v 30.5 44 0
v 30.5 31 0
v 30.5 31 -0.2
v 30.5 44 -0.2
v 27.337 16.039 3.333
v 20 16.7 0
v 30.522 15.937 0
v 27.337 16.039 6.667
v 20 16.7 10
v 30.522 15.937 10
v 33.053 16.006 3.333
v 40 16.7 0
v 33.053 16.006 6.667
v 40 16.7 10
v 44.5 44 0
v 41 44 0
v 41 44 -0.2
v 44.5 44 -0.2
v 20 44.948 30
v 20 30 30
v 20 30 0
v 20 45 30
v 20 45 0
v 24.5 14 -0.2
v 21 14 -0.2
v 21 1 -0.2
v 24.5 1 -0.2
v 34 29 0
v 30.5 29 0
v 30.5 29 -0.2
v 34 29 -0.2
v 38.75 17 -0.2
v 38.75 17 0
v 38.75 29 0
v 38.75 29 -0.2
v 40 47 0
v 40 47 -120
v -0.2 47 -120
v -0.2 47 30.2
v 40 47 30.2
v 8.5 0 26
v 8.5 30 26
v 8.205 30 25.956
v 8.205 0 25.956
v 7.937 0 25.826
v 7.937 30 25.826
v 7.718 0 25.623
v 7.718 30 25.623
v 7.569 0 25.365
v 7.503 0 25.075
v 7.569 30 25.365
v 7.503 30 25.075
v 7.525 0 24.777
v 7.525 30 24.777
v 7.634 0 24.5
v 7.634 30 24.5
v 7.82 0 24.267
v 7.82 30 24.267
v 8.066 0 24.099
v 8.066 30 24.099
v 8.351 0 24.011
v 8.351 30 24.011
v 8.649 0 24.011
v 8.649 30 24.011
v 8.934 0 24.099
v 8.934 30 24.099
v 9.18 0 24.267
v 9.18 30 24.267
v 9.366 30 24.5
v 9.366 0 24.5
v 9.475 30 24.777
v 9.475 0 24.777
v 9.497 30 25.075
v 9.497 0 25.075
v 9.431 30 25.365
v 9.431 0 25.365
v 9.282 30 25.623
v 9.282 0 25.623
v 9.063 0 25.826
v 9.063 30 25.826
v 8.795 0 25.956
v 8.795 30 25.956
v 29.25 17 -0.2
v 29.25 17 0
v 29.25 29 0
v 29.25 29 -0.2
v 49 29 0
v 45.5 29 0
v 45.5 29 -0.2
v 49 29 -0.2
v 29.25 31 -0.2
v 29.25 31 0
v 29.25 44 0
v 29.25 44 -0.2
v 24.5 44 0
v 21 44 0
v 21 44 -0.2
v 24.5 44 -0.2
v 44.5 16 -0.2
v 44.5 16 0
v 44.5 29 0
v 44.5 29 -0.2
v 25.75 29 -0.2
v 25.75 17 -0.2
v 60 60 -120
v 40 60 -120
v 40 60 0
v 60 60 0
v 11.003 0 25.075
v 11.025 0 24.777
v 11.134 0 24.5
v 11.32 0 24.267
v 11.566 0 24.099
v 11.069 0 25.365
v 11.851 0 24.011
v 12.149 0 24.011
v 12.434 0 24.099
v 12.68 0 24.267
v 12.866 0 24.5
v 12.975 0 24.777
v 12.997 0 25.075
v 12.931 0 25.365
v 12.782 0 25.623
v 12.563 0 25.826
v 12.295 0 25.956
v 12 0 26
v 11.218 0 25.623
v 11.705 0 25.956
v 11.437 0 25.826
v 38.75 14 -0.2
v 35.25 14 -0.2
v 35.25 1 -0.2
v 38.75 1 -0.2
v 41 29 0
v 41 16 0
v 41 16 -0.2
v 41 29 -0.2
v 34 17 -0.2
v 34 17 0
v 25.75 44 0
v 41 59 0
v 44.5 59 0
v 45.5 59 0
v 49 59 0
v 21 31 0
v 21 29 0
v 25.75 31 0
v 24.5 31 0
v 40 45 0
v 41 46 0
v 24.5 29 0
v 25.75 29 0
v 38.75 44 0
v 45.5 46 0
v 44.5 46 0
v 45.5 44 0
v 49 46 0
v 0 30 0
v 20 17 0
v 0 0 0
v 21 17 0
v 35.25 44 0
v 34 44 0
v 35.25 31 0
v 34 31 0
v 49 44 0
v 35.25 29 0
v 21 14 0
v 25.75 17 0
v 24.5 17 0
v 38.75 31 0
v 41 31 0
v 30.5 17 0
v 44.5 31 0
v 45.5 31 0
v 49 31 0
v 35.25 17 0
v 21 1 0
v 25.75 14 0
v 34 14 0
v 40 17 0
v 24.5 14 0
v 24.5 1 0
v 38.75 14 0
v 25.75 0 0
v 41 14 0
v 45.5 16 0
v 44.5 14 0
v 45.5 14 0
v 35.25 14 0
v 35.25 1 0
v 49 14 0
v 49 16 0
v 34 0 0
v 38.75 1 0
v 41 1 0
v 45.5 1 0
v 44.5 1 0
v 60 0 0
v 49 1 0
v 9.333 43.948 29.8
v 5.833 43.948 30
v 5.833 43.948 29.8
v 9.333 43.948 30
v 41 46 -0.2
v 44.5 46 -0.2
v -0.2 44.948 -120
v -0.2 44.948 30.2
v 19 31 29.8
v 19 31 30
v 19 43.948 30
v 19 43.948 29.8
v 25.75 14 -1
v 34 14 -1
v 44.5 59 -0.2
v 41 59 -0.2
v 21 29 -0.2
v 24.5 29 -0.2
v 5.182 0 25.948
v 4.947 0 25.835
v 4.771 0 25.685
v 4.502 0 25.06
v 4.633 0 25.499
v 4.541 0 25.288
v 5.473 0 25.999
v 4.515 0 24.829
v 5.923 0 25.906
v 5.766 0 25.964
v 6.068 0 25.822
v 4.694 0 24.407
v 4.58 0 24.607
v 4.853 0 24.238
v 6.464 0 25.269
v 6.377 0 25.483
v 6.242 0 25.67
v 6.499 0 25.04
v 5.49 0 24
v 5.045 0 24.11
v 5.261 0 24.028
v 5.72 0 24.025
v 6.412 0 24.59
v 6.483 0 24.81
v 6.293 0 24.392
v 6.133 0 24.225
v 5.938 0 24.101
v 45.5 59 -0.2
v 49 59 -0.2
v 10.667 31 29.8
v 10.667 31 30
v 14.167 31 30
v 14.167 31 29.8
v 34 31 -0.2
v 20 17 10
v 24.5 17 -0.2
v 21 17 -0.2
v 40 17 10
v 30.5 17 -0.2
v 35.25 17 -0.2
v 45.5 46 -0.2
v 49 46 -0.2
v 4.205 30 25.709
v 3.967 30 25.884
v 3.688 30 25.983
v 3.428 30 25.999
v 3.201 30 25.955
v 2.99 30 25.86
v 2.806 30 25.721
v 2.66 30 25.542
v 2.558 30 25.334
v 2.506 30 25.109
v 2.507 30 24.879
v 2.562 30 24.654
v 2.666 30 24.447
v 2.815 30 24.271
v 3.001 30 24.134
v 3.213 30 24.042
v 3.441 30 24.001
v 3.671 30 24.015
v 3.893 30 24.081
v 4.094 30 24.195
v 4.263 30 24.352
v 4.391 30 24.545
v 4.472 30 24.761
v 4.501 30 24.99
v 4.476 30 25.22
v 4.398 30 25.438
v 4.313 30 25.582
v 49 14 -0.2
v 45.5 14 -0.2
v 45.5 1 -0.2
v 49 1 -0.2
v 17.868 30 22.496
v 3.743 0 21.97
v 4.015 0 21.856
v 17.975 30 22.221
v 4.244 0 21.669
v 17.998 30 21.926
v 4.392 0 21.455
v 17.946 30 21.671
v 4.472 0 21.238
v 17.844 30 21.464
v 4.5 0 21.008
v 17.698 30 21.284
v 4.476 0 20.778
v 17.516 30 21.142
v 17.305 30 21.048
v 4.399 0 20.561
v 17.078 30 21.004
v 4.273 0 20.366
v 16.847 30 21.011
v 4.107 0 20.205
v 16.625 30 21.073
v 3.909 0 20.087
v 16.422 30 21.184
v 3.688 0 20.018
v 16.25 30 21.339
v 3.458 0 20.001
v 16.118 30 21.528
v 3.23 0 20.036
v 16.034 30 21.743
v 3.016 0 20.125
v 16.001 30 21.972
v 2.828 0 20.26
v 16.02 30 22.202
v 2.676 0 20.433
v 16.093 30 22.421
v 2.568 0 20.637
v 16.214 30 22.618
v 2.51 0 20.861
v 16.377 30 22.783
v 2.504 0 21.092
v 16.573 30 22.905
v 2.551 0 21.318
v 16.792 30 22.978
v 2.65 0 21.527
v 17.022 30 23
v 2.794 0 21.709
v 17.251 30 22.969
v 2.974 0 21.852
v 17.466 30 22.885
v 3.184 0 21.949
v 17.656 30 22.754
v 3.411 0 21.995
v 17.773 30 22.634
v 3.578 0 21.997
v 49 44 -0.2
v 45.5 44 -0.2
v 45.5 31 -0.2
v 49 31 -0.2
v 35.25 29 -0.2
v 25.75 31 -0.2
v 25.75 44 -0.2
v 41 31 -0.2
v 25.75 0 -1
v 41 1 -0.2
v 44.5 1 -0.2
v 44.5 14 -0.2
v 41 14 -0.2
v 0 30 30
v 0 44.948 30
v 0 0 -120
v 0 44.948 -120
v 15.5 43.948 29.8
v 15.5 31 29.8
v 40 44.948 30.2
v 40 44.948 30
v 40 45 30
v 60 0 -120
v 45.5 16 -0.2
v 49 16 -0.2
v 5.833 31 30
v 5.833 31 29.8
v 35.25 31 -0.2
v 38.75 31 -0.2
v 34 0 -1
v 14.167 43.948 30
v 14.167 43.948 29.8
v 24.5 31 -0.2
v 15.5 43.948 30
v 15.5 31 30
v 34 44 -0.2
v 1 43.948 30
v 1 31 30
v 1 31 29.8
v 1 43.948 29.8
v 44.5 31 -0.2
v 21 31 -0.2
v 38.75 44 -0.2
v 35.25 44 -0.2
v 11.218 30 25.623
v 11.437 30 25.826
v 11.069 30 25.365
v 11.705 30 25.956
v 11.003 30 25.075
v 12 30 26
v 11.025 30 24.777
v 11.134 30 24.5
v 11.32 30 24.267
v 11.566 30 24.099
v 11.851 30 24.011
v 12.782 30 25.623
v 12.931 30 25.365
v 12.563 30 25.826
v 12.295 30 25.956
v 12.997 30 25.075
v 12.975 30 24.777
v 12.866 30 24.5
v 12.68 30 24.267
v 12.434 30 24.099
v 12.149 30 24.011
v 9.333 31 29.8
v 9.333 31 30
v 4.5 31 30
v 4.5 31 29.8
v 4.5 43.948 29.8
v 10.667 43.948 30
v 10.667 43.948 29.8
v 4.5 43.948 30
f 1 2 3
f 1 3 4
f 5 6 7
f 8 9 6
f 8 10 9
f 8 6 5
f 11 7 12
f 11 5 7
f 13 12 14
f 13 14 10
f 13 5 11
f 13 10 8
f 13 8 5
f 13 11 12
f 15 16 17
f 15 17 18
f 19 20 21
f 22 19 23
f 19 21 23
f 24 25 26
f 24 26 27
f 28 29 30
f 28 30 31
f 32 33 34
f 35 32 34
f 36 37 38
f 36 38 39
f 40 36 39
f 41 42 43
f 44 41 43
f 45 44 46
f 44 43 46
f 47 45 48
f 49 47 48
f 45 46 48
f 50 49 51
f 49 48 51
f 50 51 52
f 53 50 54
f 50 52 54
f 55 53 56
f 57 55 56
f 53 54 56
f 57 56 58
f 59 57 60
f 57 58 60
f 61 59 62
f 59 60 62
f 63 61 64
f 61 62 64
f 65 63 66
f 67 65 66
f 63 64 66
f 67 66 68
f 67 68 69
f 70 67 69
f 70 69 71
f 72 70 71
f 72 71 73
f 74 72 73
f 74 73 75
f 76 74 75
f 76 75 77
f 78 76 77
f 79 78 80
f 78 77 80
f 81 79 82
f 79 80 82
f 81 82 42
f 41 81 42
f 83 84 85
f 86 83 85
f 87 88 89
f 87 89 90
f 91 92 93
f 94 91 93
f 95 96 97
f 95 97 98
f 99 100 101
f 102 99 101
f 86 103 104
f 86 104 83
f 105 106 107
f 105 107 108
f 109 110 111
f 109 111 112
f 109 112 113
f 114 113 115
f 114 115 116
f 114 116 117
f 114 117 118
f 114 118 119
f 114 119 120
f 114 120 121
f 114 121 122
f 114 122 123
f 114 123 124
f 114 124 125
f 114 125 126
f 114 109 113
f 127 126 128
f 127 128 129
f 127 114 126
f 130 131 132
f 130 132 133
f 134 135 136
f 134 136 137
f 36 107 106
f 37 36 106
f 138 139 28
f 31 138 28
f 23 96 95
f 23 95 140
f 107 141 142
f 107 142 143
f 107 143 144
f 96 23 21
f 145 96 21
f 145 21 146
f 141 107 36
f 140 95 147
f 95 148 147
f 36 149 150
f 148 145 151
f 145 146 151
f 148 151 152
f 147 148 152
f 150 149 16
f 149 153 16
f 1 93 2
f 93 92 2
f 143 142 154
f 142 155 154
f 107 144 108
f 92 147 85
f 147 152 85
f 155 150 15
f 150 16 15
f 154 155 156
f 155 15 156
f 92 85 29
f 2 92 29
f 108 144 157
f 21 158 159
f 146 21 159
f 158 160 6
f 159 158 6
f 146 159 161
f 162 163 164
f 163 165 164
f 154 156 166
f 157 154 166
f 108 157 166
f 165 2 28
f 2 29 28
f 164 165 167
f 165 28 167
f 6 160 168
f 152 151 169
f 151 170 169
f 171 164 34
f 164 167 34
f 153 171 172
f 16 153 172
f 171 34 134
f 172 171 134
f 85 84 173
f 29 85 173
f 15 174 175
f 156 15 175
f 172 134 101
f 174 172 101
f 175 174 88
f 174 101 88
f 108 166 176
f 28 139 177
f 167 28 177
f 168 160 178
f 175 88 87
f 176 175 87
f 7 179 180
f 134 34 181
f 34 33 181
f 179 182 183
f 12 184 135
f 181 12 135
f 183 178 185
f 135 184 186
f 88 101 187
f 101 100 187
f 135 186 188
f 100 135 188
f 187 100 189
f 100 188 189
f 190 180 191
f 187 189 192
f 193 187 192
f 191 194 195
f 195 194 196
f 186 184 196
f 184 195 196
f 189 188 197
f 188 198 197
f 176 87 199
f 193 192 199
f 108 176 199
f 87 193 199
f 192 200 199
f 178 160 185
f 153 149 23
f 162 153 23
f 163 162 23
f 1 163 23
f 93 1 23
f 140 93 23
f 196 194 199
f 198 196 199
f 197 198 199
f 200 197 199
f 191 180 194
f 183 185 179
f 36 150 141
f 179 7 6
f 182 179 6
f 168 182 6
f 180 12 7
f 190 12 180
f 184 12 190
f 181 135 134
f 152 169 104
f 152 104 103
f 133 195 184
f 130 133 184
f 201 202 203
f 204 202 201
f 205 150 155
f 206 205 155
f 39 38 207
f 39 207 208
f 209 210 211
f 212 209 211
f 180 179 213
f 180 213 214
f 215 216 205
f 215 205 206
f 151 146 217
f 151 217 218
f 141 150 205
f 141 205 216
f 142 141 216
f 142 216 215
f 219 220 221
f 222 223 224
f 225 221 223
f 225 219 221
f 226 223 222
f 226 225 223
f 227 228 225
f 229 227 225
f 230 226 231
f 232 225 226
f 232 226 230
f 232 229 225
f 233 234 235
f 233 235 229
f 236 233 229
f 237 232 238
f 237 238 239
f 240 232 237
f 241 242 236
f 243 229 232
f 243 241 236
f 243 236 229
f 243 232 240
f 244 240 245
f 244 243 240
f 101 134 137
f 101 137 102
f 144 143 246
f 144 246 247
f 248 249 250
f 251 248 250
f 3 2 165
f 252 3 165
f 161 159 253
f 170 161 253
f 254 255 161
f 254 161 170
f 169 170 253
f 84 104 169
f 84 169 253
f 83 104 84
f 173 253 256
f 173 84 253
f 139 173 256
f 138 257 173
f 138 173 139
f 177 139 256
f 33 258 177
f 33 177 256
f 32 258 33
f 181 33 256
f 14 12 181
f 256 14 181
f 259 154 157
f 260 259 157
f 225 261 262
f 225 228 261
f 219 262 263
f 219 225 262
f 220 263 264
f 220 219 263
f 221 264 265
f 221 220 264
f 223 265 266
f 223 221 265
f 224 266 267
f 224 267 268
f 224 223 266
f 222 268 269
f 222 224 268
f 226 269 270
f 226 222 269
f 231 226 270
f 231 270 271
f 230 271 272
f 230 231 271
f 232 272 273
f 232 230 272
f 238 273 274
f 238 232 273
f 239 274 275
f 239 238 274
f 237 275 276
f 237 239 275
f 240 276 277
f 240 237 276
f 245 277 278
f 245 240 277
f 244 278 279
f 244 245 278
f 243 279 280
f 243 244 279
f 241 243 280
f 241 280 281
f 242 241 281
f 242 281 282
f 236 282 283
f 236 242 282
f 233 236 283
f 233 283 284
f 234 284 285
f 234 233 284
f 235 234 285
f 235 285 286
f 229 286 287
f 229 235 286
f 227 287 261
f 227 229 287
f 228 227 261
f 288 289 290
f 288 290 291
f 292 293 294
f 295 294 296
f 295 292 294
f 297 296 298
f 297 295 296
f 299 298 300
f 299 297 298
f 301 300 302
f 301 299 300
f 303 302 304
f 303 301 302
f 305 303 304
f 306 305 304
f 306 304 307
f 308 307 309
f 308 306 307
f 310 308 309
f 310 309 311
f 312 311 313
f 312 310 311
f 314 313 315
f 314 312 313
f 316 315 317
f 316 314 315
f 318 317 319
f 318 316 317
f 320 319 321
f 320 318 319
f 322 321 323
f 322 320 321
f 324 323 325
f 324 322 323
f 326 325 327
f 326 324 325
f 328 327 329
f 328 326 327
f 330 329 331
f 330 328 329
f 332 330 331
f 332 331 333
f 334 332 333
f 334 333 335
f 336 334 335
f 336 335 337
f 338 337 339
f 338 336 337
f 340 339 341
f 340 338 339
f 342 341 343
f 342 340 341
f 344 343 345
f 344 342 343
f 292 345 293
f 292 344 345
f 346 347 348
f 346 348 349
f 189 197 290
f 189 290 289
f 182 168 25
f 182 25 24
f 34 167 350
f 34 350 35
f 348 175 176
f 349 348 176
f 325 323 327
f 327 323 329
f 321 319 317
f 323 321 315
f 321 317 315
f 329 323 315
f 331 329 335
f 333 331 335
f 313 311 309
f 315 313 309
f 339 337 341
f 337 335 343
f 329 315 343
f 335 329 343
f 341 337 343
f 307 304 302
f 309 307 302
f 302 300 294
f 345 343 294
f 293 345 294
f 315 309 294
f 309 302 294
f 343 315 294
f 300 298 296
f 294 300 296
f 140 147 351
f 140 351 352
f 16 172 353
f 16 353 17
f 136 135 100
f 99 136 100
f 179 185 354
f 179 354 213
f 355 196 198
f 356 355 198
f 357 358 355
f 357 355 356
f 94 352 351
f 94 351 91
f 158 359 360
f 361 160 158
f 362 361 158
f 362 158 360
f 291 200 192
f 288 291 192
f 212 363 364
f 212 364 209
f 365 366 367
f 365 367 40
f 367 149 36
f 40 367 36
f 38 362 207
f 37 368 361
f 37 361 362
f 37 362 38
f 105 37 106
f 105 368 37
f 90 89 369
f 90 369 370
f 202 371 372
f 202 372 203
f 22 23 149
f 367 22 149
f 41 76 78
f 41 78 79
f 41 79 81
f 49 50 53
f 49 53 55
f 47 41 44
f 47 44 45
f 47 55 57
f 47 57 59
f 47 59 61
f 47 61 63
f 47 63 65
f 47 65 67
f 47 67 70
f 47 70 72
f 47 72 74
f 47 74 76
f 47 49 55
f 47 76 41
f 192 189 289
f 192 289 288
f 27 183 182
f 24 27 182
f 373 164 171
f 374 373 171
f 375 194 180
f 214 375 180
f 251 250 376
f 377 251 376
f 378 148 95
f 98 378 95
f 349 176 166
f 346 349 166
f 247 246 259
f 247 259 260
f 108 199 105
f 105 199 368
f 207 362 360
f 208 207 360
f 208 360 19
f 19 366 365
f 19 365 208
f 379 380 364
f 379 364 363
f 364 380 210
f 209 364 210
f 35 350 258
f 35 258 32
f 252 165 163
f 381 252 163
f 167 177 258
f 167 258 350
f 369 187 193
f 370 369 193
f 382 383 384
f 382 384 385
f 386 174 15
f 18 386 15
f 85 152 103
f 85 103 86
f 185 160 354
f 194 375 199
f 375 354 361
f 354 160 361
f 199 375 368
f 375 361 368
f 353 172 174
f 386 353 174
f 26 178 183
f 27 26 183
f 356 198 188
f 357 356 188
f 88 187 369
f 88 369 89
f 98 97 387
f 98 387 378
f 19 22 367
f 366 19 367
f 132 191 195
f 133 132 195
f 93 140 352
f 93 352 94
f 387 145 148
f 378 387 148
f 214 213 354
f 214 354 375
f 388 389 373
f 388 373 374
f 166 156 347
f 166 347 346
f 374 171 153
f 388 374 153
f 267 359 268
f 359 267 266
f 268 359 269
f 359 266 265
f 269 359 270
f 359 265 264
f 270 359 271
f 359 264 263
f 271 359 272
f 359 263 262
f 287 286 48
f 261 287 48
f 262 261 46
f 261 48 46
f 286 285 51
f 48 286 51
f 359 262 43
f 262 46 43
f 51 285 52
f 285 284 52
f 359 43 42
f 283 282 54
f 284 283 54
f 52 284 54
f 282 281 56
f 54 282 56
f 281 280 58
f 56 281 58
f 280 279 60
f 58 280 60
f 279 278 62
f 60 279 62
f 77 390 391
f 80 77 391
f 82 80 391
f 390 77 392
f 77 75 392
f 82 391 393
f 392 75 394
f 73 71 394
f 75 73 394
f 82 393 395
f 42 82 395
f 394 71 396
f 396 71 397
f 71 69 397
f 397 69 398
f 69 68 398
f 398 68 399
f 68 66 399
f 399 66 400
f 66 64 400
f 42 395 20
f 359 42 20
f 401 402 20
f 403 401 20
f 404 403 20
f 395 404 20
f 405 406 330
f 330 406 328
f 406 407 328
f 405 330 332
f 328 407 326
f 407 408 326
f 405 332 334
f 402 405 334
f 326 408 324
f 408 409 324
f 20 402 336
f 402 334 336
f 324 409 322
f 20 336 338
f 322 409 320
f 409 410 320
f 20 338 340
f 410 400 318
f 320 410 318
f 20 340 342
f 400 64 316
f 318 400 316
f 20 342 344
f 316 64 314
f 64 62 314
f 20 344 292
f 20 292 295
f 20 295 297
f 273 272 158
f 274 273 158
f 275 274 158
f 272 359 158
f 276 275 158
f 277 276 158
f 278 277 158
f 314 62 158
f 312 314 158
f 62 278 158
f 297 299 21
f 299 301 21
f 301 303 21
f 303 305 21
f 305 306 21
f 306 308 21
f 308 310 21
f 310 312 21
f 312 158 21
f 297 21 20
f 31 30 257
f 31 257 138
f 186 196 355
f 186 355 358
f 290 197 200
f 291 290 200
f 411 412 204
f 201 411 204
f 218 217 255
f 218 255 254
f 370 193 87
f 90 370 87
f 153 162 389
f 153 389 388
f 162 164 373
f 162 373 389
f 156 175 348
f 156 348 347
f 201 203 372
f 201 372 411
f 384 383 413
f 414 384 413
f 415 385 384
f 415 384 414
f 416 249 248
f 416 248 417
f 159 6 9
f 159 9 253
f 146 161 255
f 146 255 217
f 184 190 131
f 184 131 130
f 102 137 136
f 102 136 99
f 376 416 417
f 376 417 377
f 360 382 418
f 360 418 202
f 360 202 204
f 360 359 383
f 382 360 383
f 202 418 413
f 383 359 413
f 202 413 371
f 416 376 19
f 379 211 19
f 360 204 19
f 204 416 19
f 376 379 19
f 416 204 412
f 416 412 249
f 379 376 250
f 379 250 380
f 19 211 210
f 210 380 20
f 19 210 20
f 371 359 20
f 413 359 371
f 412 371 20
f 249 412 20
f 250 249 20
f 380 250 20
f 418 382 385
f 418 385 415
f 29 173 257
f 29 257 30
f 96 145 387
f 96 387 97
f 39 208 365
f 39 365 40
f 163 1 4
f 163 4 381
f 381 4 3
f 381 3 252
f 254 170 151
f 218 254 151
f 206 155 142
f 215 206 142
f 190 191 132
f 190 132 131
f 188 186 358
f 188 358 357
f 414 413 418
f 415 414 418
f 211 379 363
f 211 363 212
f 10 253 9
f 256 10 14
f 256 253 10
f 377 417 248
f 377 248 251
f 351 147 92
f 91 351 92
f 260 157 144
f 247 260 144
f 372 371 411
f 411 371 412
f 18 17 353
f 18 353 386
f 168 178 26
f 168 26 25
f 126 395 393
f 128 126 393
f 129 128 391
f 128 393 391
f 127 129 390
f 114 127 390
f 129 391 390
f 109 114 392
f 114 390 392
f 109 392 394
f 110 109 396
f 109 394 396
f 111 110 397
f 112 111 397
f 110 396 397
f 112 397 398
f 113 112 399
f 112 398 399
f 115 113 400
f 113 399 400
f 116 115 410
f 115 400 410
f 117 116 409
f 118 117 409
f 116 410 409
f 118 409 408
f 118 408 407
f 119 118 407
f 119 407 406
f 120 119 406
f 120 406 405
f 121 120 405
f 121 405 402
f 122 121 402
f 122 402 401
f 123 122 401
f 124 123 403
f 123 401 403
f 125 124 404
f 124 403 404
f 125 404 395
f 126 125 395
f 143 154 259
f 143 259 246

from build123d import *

# Parameters (mm, degrees)
SKETCH1_W                = 60
SKETCH1_H                = 120
BOSS_EXTRUDE1_DEPTH      = 60
SKETCH2_W                = 40
SKETCH2_H                = 120
CUT_EXTRUDE1_DEPTH       = 15
SKETCH3_W                = 20
SKETCH3_H                = 15
BOSS_EXTRUDE2_DEPTH      = 30
SKETCH4_W                = 40
SKETCH4_H                = 150
BOSS_EXTRUDE3_DEPTH      = 2
SKETCH6_W                = 3.5
SKETCH6_H                = 13
CUT_EXTRUDE2_DEPTH       = 0.2
SKETCH7_W                = 40
SKETCH7_H                = 2.051563456
BOSS_EXTRUDE5_DEPTH      = 0.2
SKETCH8_W                = 3.5
SKETCH8_H                = 12.948436544
CUT_EXTRUDE3_DEPTH       = 0.2
SKETCH9_W                = 3.5
SKETCH9_H                = 13
CUT_EXTRUDE4_DEPTH       = 0.2
BOSS_EXTRUDE6_DEPTH      = 10
BOSS_EXTRUDE6_DEPTH_BACK = 5
SKETCH5_W                = 20
SKETCH5_H                = 2
CUT_EXTRUDE6_DEPTH       = 10
SKETCH11_R               = 1
BOSS_EXTRUDE7_DEPTH      = 30
SKETCH16_W               = 8.25
SKETCH16_H               = 14
CUT_EXTRUDE10_DEPTH      = 1
SKETCH17_W               = 150.2
SKETCH17_H               = 2.051563456
BOSS_EXTRUDE8_DEPTH      = 0.2


with BuildPart() as part:
    # Sketch1 → Boss-Extrude1 (new body)
    with BuildSketch(Plane(origin=(0, 0, 0), x_dir=(1, 0, 0), z_dir=(0, 1, 0))):
        with Locations((30, 60)):
            Rectangle(SKETCH1_W, SKETCH1_H)
    extrude(amount=BOSS_EXTRUDE1_DEPTH)

    # Sketch2 → Cut-Extrude1 (cut)
    with BuildSketch(Plane(origin=(0, 60, 0), x_dir=(1, 0, 0), z_dir=(0, 1, 0))):
        with Locations((20, 60)):
            Rectangle(SKETCH2_W, SKETCH2_H)
    extrude(amount=-CUT_EXTRUDE1_DEPTH, mode=Mode.SUBTRACT)

    # Sketch3 → Boss-Extrude2 (add)
    with BuildSketch(Plane.XY):
        with Locations((10, 37.5)):
            Rectangle(SKETCH3_W, SKETCH3_H)
    extrude(amount=BOSS_EXTRUDE2_DEPTH)

    # Sketch4 → Boss-Extrude3 (add)
    with BuildSketch(Plane(origin=(0, 45, 0), x_dir=(1, 0, 0), z_dir=(0, 1, 0))):
        with Locations((20, 45)):
            Rectangle(SKETCH4_W, SKETCH4_H)
    extrude(amount=BOSS_EXTRUDE3_DEPTH)

    # Sketch6 → Cut-Extrude2 (cut)
    with BuildSketch(Plane.XY):
        with Locations((42.75, 52.5)):
            Rectangle(SKETCH6_W, SKETCH6_H)
        with Locations((47.25, 52.5)):
            Rectangle(SKETCH6_W, SKETCH6_H)
        with Locations((42.75, 37.5)):
            Rectangle(SKETCH6_W, SKETCH6_H)
        with Locations((47.25, 37.5)):
            Rectangle(SKETCH6_W, SKETCH6_H)
        with Locations((42.75, 22.5)):
            Rectangle(SKETCH6_W, SKETCH6_H)
        with Locations((47.25, 22.5)):
            Rectangle(SKETCH6_W, SKETCH6_H)
        with Locations((42.75, 7.5)):
            Rectangle(SKETCH6_W, SKETCH6_H)
        with Locations((47.25, 7.5)):
            Rectangle(SKETCH6_W, SKETCH6_H)
    extrude(amount=-CUT_EXTRUDE2_DEPTH, mode=Mode.SUBTRACT)

    # Sketch7 → Boss-Extrude5 (add)
    with BuildSketch(Plane.XY.offset(30)):
        with Locations((20, 45.974218272)):
            Rectangle(SKETCH7_W, SKETCH7_H)
    extrude(amount=BOSS_EXTRUDE5_DEPTH)

    # Sketch8 → Cut-Extrude3 (cut)
    with BuildSketch(Plane.XY.offset(30)):
        with Locations((2.75, 37.474218272)):
            Rectangle(SKETCH8_W, SKETCH8_H)
        with Locations((7.583333333, 37.474218272)):
            Rectangle(SKETCH8_W, SKETCH8_H)
        with Locations((12.416666667, 37.474218272)):
            Rectangle(SKETCH8_W, SKETCH8_H)
        with Locations((17.25, 37.474218272)):
            Rectangle(SKETCH8_W, SKETCH8_H)
    extrude(amount=-CUT_EXTRUDE3_DEPTH, mode=Mode.SUBTRACT)

    # Sketch9 → Cut-Extrude4 (cut)
    with BuildSketch(Plane.XY):
        with Locations((22.75, 37.5)):
            Rectangle(SKETCH9_W, SKETCH9_H)
        with Locations((27.5, 37.5)):
            Rectangle(SKETCH9_W, SKETCH9_H)
        with Locations((32.25, 37.5)):
            Rectangle(SKETCH9_W, SKETCH9_H)
        with Locations((37, 37.5)):
            Rectangle(SKETCH9_W, SKETCH9_H)
        with Locations((27.5, 22.5)):
            Rectangle(SKETCH9_W, SKETCH9_H)
        with Locations((32.25, 22.5)):
            Rectangle(SKETCH9_W, SKETCH9_H)
        with Locations((37, 22.5)):
            Rectangle(SKETCH9_W, SKETCH9_H)
        with Locations((27.5, 7.5)):
            Rectangle(SKETCH9_W, SKETCH9_H)
        with Locations((32.25, 7.5)):
            Rectangle(SKETCH9_W, SKETCH9_H)
        with Locations((37, 7.5)):
            Rectangle(SKETCH9_W, SKETCH9_H)
        with Locations((22.75, 22.5)):
            Rectangle(SKETCH9_W, SKETCH9_H)
        with Locations((22.75, 7.5)):
            Rectangle(SKETCH9_W, SKETCH9_H)
    extrude(amount=-CUT_EXTRUDE4_DEPTH, mode=Mode.SUBTRACT)

    # Sketch5 → Boss-Extrude6 (add, two sides: drawn at the far end of the back side and taken through both)
    with BuildSketch(Plane.XY.offset(-BOSS_EXTRUDE6_DEPTH_BACK)):
        with Locations((30, 16)):
            Rectangle(SKETCH5_W, SKETCH5_H)
    extrude(amount=BOSS_EXTRUDE6_DEPTH + BOSS_EXTRUDE6_DEPTH_BACK)

    # Sketch10 → Cut-Extrude6 (cut)
    with BuildSketch(Plane.XY.offset(10)):
        with BuildLine():
            Line((20, 16.7), (20, 14.90002652))
            Line((20, 14.90002652), (40, 15))
            Line((40, 15), (40, 16.7))
            add(Edge.make_bspline(
                [(20, 16.7), (29.09733539, 15.758398235), (31.486505864, 15.609879035), (40, 16.7)],
                knots=[0, 0, 0, 0, 1, 1, 1, 1], degree=3))
        make_face()
    extrude(amount=-CUT_EXTRUDE6_DEPTH, mode=Mode.SUBTRACT)

    # Sketch11 → Boss-Extrude7 (add)
    with BuildSketch(Plane(origin=(0, 30, 0), x_dir=(-1, 0, 0), z_dir=(0, -1, 0))):
        with Locations(Location((-8.5, -25, 0), (0, 0, 270))):
            Circle(SKETCH11_R)
        with Locations(Location((-12, -25, 0), (0, 0, 270))):
            Circle(SKETCH11_R)
    extrude(amount=BOSS_EXTRUDE7_DEPTH)

    # Boundary2: read off the stored shape, not the designer's step
    # Boundary2: loft between two sections, ruled curve by curve
    boundary2_from = [
        Edge.make_bspline([(4.204798324, 30, 25.709407727), (4.019075815, 30, 25.893923496), (3.495882591, 30, 26.110214391), (2.712993599, 30, 25.781419672), (2.391347556, 30, 24.99649345), (2.718236803, 30, 24.213124048), (3.503720437, 30, 23.891348254), (4.286533285, 30, 24.218104118), (4.610217643, 30, 25.003119773), (4.390520832, 30, 25.524891957), (4.204798324, 30, 25.709407727)], [0, 0, 0, 0, 0.125, 0.25, 0.375, 0.5, 0.625, 0.75, 0.875, 1, 1, 1, 1], 3),
    ]
    boundary2_to = [
        Edge.make_bspline([(5.766012578, 0, 25.963969558), (5.513645938, 0, 26.033611488), (4.951638215, 0, 25.965345689), (4.430818642, 0, 25.294698155), (4.535715543, 0, 24.452936912), (5.20493851, 0, 23.930763741), (6.047249113, 0, 24.035821103), (6.569002789, 0, 24.704654753), (6.465838055, 0, 25.547494109), (6.018379218, 0, 25.894327628), (5.766012578, 0, 25.963969558)], [0, 0, 0, 0, 0.125, 0.25, 0.375, 0.5, 0.625, 0.75, 0.875, 1, 1, 1, 1], 3),
    ]
    boundary2 = Solid(Shell([*[Face.make_surface_from_curves(boundary2_from[k], boundary2_to[k]) for k in range(1)], Face(Wire(boundary2_from)), Face(Wire(boundary2_to))]))
    add(boundary2)

    # Boundary3: read off the stored shape, not the designer's step
    # Boundary3: loft between two sections, ruled curve by curve
    boundary3_from = [
        Edge.make_bspline([(3.743086281, 0, 21.97000467), (3.99703291, 0, 21.906364831), (4.452587923, 0, 21.570236089), (4.575703736, 0, 20.730079176), (4.069951831, 0, 20.049064962), (3.230368388, 0, 19.924069587), (2.548955021, 0, 20.43023164), (2.424133085, 0, 21.26926968), (2.92890815, 0, 21.952075126), (3.489139652, 0, 22.03364451), (3.743086281, 0, 21.97000467)], [0, 0, 0, 0, 0.125, 0.25, 0.375, 0.5, 0.625, 0.75, 0.875, 1, 1, 1, 1], 3),
    ]
    boundary3_to = [
        Edge.make_bspline([(17.868163304, 30, 22.496278629), (17.998088745, 30, 22.268994008), (18.071017752, 30, 21.707572365), (17.550107266, 30, 21.036995444), (16.708568065, 30, 20.930331844), (16.03703216, 30, 21.449527114), (15.930388089, 30, 22.291638296), (16.449309955, 30, 22.962671415), (17.291465105, 30, 23.071280094), (17.738237863, 30, 22.723563251), (17.868163304, 30, 22.496278629)], [0, 0, 0, 0, 0.125, 0.25, 0.375, 0.5, 0.625, 0.75, 0.875, 1, 1, 1, 1], 3),
    ]
    boundary3 = Solid(Shell([*[Face.make_surface_from_curves(boundary3_from[k], boundary3_to[k]) for k in range(1)], Face(Wire(boundary3_from)), Face(Wire(boundary3_to))]))
    add(boundary3)

    # Sketch16 → Cut-Extrude10 (cut)
    with BuildSketch(Plane.XY):
        with Locations((29.875, 7)):
            Rectangle(SKETCH16_W, SKETCH16_H)
    extrude(amount=-CUT_EXTRUDE10_DEPTH, mode=Mode.SUBTRACT)

    # Sketch17 → Boss-Extrude8 (add)
    with BuildSketch(Plane.ZY):
        with Locations((-44.9, 45.974218272)):
            Rectangle(SKETCH17_W, SKETCH17_H)
    extrude(amount=BOSS_EXTRUDE8_DEPTH)


solid = part.part
